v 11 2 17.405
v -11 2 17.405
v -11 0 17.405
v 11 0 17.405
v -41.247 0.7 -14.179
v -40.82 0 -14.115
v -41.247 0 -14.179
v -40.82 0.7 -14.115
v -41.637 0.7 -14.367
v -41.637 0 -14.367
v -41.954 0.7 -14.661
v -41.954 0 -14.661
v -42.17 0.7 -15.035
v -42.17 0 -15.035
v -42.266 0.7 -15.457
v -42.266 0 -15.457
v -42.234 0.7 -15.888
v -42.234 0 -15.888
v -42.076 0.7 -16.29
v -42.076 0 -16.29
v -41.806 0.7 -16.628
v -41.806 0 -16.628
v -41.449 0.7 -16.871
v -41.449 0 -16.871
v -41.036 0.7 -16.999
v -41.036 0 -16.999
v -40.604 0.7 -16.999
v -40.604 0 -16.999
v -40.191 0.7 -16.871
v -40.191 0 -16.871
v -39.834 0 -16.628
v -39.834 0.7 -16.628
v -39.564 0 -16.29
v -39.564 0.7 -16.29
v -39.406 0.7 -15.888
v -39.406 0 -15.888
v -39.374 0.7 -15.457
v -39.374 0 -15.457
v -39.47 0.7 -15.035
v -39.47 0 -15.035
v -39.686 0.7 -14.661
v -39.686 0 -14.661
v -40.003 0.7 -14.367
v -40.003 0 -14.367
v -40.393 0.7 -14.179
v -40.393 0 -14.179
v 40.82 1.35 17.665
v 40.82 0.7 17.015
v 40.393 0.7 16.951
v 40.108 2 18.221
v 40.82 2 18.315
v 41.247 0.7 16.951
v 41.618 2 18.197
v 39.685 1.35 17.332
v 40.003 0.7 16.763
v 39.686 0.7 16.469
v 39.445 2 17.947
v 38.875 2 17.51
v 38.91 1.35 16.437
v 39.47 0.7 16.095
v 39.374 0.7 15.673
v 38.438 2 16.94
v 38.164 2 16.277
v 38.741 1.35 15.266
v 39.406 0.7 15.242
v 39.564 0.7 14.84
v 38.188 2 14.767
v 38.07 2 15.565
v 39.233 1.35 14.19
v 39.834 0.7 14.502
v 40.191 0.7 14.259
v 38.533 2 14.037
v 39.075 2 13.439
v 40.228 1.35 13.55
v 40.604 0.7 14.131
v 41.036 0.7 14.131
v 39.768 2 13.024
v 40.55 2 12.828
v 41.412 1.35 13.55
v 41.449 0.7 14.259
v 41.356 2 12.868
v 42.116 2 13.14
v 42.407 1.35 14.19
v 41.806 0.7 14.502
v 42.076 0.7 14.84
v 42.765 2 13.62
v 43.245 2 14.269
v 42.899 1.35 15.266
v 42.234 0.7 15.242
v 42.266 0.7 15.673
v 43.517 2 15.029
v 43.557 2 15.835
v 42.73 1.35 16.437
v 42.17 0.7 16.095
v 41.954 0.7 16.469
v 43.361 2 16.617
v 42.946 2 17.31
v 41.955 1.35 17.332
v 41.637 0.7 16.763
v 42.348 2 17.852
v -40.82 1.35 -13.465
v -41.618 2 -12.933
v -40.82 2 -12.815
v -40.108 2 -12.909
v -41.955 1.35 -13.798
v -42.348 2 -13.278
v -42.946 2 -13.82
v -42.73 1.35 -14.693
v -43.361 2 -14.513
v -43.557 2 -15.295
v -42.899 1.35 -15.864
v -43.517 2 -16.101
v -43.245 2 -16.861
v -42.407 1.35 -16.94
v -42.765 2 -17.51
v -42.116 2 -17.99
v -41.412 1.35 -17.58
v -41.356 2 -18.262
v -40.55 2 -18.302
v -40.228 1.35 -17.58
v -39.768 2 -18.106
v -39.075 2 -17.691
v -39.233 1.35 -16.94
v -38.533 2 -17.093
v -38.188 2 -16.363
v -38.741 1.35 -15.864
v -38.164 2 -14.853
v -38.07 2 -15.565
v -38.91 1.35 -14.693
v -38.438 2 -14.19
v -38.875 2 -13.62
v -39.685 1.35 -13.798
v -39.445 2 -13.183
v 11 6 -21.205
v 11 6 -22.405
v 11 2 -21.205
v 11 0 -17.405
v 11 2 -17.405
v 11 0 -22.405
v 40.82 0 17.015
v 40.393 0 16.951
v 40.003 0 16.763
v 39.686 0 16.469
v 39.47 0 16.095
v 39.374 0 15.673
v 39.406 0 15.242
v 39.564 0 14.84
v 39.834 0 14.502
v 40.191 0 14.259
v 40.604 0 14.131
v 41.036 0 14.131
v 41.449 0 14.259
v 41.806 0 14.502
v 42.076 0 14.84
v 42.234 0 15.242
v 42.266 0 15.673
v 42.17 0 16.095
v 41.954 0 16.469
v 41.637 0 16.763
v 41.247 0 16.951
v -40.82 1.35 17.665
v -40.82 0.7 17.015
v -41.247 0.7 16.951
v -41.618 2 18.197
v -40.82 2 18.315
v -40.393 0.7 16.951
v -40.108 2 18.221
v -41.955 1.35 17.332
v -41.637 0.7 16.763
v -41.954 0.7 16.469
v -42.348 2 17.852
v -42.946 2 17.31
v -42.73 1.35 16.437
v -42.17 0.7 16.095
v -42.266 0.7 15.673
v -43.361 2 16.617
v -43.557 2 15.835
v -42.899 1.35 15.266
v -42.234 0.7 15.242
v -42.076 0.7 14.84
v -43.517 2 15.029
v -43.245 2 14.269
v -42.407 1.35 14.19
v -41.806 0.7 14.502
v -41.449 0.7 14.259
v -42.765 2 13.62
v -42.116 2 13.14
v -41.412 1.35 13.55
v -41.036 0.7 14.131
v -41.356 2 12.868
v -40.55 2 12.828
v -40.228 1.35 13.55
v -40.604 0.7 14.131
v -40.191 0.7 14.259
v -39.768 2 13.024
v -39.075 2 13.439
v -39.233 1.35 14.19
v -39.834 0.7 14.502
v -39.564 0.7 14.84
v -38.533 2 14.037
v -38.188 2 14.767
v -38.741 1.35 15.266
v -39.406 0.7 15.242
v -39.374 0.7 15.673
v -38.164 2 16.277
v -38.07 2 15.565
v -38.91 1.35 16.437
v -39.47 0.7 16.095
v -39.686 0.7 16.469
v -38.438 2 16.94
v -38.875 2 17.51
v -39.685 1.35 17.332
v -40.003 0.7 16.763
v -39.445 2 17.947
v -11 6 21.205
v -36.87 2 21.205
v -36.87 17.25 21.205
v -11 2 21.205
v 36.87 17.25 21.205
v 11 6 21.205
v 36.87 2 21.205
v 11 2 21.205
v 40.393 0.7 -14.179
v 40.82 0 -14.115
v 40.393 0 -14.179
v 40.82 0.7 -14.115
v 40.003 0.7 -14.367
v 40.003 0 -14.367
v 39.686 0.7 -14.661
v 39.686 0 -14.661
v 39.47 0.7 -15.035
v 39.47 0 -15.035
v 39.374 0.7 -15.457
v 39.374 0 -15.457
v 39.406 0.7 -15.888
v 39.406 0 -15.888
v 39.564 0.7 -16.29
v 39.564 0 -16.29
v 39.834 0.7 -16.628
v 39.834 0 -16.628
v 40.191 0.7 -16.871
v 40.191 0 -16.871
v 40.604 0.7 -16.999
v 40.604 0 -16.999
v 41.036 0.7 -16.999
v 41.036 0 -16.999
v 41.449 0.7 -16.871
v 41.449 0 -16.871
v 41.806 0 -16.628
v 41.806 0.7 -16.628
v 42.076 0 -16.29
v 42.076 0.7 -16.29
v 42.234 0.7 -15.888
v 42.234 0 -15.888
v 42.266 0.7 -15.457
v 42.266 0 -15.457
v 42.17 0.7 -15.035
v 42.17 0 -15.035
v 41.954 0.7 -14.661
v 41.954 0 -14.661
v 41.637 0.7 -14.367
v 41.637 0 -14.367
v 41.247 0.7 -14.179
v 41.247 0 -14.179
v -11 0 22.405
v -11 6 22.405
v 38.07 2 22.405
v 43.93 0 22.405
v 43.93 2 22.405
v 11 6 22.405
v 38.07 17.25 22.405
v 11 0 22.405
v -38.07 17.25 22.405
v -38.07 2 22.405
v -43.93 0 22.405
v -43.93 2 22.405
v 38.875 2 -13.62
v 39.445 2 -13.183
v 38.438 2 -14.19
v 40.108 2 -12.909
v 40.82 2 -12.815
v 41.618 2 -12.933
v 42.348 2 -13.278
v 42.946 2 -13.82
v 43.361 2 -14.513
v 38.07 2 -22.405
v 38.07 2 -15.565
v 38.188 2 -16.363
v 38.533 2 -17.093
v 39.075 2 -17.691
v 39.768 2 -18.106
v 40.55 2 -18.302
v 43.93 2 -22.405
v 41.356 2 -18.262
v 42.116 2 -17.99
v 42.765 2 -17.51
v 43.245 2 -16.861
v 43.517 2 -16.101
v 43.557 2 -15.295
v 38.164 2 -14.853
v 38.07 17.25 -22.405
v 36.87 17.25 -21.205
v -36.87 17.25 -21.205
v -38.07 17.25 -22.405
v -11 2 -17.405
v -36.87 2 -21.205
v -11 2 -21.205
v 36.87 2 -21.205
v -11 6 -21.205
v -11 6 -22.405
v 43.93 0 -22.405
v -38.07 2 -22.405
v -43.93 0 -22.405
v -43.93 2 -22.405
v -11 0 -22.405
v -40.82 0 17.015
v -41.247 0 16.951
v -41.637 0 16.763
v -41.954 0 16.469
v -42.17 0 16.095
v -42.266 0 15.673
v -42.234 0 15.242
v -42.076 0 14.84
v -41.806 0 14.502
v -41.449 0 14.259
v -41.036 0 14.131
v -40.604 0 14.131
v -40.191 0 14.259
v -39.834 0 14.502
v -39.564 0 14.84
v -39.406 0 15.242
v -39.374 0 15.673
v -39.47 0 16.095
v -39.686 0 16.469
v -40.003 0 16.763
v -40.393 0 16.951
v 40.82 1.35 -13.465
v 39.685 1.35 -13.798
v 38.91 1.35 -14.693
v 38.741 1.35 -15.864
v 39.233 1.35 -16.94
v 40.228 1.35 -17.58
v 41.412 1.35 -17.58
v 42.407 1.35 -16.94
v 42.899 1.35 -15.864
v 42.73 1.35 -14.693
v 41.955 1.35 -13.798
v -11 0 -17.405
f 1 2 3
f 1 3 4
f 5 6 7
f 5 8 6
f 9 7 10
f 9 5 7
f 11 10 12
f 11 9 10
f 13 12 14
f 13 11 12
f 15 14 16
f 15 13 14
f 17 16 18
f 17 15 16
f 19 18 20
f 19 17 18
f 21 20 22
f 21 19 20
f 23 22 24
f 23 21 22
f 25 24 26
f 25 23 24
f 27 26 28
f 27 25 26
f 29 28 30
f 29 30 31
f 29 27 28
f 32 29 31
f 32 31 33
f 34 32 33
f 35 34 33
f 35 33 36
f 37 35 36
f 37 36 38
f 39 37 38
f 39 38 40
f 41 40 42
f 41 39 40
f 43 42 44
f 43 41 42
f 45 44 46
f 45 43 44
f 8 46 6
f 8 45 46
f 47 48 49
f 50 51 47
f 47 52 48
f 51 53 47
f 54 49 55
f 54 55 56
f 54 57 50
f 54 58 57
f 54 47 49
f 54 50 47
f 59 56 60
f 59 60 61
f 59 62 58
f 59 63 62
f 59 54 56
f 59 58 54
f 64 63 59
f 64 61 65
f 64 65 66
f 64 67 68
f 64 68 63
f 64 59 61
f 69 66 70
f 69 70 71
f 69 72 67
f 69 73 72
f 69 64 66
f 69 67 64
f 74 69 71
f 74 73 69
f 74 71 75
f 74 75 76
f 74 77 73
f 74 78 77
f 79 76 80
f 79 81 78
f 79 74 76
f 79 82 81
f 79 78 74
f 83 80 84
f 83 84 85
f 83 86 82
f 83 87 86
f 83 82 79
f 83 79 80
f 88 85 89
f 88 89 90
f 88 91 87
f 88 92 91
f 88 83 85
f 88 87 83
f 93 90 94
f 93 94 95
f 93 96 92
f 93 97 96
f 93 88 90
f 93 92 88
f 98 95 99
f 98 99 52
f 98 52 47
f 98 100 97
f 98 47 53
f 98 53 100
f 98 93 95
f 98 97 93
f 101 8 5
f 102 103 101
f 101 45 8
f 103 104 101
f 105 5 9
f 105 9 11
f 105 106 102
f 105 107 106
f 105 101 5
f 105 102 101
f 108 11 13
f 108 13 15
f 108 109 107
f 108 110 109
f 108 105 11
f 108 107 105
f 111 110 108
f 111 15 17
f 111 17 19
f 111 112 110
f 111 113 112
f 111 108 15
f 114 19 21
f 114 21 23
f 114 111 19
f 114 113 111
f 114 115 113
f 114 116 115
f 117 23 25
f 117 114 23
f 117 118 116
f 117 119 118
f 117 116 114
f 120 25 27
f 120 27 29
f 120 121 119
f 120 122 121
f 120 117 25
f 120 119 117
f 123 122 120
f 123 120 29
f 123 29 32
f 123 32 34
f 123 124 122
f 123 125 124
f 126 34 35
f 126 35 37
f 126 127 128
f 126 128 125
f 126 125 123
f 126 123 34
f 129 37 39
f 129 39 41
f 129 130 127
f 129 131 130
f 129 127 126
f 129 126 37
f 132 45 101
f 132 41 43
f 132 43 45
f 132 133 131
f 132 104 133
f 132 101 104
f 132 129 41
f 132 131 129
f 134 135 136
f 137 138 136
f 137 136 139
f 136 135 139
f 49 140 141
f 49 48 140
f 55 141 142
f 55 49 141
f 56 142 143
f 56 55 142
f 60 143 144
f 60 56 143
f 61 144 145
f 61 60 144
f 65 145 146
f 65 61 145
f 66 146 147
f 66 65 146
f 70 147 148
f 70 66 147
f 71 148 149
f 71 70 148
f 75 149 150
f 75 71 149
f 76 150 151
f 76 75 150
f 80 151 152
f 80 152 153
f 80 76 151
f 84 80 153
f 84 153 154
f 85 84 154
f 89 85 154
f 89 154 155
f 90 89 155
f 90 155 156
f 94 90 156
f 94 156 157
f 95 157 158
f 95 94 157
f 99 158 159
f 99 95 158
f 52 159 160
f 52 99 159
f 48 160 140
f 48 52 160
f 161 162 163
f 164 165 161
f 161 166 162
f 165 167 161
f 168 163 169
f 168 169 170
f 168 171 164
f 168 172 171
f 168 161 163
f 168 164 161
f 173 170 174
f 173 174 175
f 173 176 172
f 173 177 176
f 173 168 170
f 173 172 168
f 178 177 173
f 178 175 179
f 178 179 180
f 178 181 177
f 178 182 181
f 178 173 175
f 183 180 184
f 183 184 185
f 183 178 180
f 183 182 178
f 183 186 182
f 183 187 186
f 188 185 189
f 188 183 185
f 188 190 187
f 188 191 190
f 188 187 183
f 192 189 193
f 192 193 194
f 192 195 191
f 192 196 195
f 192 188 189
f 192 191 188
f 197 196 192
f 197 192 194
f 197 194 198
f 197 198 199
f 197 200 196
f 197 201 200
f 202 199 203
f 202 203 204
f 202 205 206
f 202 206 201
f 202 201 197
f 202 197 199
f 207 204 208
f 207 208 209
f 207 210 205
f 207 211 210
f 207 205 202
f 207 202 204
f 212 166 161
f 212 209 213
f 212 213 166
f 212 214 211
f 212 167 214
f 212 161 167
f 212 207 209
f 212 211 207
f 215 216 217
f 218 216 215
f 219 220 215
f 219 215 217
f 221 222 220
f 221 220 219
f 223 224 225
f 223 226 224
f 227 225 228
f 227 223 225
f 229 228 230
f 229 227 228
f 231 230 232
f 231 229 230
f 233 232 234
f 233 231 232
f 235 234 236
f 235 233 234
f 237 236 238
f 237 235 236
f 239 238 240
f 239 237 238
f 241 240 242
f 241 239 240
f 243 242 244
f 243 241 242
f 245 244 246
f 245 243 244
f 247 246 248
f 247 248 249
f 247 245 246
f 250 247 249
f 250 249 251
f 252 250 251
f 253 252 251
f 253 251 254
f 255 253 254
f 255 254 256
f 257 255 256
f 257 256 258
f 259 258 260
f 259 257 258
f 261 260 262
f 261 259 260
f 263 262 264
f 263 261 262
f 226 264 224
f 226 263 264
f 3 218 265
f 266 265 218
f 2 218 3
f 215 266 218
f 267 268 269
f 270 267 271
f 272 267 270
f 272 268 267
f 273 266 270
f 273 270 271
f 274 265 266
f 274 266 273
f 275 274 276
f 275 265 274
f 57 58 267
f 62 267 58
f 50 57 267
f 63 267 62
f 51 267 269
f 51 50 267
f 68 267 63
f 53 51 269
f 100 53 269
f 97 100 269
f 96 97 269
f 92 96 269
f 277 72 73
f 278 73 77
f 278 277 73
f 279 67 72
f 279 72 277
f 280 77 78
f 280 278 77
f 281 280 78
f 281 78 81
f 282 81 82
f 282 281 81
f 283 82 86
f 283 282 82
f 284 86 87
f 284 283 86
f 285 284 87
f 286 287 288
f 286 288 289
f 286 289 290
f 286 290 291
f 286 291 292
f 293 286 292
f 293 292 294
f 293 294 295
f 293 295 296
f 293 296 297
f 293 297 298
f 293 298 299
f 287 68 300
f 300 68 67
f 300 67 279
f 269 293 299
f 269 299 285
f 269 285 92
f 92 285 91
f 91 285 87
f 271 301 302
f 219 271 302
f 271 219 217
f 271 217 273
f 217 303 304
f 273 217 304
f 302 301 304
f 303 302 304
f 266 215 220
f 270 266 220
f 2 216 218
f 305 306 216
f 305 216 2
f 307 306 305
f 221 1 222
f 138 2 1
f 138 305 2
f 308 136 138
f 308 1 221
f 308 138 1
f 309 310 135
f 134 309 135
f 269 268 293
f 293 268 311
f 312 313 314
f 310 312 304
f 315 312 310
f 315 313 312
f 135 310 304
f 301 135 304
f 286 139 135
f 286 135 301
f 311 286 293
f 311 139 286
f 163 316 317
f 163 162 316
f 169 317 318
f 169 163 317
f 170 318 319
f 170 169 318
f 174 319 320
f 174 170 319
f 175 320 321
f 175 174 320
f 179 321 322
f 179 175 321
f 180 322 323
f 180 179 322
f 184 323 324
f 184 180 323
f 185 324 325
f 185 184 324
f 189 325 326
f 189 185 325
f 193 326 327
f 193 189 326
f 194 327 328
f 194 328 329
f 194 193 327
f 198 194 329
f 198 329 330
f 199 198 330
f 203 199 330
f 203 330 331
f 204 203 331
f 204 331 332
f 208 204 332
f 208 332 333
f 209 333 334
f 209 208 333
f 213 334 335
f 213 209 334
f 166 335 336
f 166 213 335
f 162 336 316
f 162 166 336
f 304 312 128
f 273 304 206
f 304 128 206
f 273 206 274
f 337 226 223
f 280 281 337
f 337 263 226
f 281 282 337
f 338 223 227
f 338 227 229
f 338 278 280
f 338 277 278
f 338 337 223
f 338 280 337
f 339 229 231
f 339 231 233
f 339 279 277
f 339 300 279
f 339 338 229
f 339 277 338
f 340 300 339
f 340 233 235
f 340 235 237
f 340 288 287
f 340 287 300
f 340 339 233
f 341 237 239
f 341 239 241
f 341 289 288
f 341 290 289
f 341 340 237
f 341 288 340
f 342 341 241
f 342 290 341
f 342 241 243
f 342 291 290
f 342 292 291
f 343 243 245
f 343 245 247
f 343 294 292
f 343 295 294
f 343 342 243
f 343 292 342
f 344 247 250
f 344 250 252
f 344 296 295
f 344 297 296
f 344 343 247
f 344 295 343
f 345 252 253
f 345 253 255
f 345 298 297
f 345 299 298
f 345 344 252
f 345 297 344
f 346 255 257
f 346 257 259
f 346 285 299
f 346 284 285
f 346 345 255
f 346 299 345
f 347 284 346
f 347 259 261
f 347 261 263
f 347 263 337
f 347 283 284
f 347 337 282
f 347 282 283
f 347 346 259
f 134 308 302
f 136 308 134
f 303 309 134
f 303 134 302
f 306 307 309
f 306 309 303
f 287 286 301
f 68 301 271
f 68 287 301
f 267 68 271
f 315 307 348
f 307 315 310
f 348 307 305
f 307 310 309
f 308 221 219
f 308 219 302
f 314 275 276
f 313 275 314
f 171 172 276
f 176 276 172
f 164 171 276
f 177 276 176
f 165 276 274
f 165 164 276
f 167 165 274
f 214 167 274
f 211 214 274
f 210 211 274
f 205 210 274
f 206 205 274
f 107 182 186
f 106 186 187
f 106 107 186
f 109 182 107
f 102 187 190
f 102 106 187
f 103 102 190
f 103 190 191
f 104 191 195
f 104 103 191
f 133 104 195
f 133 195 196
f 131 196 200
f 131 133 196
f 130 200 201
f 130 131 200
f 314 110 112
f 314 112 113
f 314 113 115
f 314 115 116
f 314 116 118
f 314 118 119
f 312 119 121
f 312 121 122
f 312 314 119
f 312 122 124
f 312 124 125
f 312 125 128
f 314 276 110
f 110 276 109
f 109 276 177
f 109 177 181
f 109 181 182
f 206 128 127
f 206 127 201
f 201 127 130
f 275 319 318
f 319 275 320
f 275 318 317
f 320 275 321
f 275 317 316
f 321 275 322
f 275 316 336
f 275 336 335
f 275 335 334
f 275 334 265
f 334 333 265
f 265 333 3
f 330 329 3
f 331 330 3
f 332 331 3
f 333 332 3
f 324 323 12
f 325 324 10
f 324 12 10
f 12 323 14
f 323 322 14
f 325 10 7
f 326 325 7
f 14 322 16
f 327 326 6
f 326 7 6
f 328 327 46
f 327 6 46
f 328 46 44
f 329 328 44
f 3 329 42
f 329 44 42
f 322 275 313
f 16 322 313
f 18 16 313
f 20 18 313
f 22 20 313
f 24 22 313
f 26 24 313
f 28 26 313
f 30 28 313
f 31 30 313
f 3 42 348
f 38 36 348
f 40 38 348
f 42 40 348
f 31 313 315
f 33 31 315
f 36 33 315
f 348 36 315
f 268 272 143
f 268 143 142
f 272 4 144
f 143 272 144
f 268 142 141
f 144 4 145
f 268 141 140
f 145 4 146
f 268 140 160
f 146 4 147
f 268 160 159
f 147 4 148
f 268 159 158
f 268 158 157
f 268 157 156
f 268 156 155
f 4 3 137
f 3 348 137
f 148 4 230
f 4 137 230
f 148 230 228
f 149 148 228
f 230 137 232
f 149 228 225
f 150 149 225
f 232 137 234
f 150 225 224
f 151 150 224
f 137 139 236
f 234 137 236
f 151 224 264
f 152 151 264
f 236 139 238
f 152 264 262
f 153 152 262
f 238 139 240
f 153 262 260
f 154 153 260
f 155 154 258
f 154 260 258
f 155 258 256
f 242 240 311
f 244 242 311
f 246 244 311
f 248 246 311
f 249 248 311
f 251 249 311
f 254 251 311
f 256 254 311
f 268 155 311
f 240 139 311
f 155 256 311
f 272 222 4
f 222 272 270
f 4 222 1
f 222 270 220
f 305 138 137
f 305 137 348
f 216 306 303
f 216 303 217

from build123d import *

# Parameters (mm, degrees)
SKETCH1_W                                    = 87.86
SKETCH1_H                                    = 44.81
BOSS_EXTRUDE1_DEPTH                          = 2
CSK_FOR_M2_5_COUNTERSUNK_FLAT_HEAD_S_2_COUNT = 2
CSK_FOR_M2_5_COUNTERSUNK_FLAT_HEAD_S_2_PITCH = 31.13
CSK_FOR_M2_5_COUNTERSUNK_FLAT_HEAD_S_3_COUNT = 2
CSK_FOR_M2_5_COUNTERSUNK_FLAT_HEAD_S_3_PITCH = 87.373717444
CSK_FOR_M2_5_COUNTERSUNK_FLAT_HEAD_S_4_COUNT = 2
CSK_FOR_M2_5_COUNTERSUNK_FLAT_HEAD_S_4_PITCH = 81.64
BOSS_EXTRUDE2_DEPTH                          = 15.25
BOSS_EXTRUDE3_DEPTH                          = 15.25
CUT_EXTRUDE1_DEPTH                           = 50
CUT_EXTRUDE1_DEPTH_BACK                      = 15.25
CUT_EXTRUDE4_DEPTH                           = 15.25
SKETCH11_W                                   = 22
SKETCH11_H                                   = 5
CUT_EXTRUDE5_DEPTH                           = 15.25


with BuildPart() as part:
    # Sketch1 → Boss-Extrude1 (new body)
    with BuildSketch(Plane(origin=(0, 0, 0), x_dir=(1, 0, 0), z_dir=(0, 1, 0))):
        Rectangle(SKETCH1_W, SKETCH1_H)
    extrude(amount=BOSS_EXTRUDE1_DEPTH)

    # Sketch3 → CSK for M2.5 Countersunk Flat Head Screw1 (revolve, cut)
    with BuildSketch(Plane(origin=(-40.82, 2, -15.565), x_dir=(0, 0, 1), z_dir=(1, 0, 0))):
        Polygon((0, 0), (0, 2), (1.45, 2), (1.45, 1.3), (2.75, 0), align=None)
    csk_for_m2_5_countersunk_flat_head_screw = revolve(axis=Axis((-40.82, 8.35, -15.565), (0, -1, 0)), mode=Mode.SUBTRACT)

    # CSK for M2.5 Countersunk Flat Head S 2: CSK for M2.5 Countersunk Flat Head Screw1 ×2
    with Locations(*[(0, 0, i * CSK_FOR_M2_5_COUNTERSUNK_FLAT_HEAD_S_2_PITCH) for i in range(1, CSK_FOR_M2_5_COUNTERSUNK_FLAT_HEAD_S_2_COUNT)]):
        add(csk_for_m2_5_countersunk_flat_head_screw, mode=Mode.SUBTRACT)

    # CSK for M2.5 Countersunk Flat Head S 3: CSK for M2.5 Countersunk Flat Head Screw1 ×2
    with Locations(*[Vector(0.9343770917408808, 0, 0.35628563040046085) * (i * CSK_FOR_M2_5_COUNTERSUNK_FLAT_HEAD_S_3_PITCH) for i in range(1, CSK_FOR_M2_5_COUNTERSUNK_FLAT_HEAD_S_3_COUNT)]):
        add(csk_for_m2_5_countersunk_flat_head_screw, mode=Mode.SUBTRACT)

    # CSK for M2.5 Countersunk Flat Head S 4: CSK for M2.5 Countersunk Flat Head Screw1 ×2
    with Locations(*[(i * CSK_FOR_M2_5_COUNTERSUNK_FLAT_HEAD_S_4_PITCH, 0, 0) for i in range(1, CSK_FOR_M2_5_COUNTERSUNK_FLAT_HEAD_S_4_COUNT)]):
        add(csk_for_m2_5_countersunk_flat_head_screw, mode=Mode.SUBTRACT)

    # Sketch5 → Boss-Extrude2 (add)
    with BuildSketch(Plane(origin=(0, 2, 0), x_dir=(1, 0, 0), z_dir=(0, 1, 0))):
        Polygon((-38.07, 15.565), (-38.07, 22.405), (-36.87, 22.405), (-36.87, -22.405), (-38.07, -22.405), align=None)
    extrude(amount=BOSS_EXTRUDE2_DEPTH)

    # Sketch6 → Boss-Extrude3 (add)
    with BuildSketch(Plane(origin=(0, 2, 0), x_dir=(1, 0, 0), z_dir=(0, 1, 0))):
        Polygon((-36.87, 22.405), (38.07, 22.405), (38.07, -22.405), (-36.87, -22.405), (-36.87, -21.205), (36.87, -21.205), (36.87, 21.205), (-36.87, 21.205), align=None)
    extrude(amount=BOSS_EXTRUDE3_DEPTH)

    # Sketch7 → Cut-Extrude1 (cut, two sides: drawn at the far end of the back side and taken through both)
    with BuildSketch(Plane.XY.offset(-21.205).offset(-CUT_EXTRUDE1_DEPTH_BACK)):
        Polygon((0, 2), (-11, 2), (-11, 6), (11, 6), (11, 2), align=None)
    extrude(amount=CUT_EXTRUDE1_DEPTH + CUT_EXTRUDE1_DEPTH_BACK, mode=Mode.SUBTRACT)

    # Sketch10 → Cut-Extrude4 (cut)
    with BuildSketch(Plane(origin=(0, 2, 0), x_dir=(1, 0, 0), z_dir=(0, 1, 0))):
        Polygon((-11, 21.205), (-11, 22.405), (11, 22.405), (11, 17.405), (-11, 17.405), align=None)
    extrude(amount=-CUT_EXTRUDE4_DEPTH, mode=Mode.SUBTRACT)

    # Sketch11 → Cut-Extrude5 (cut)
    with BuildSketch(Plane(origin=(0, 2, 0), x_dir=(1, 0, 0), z_dir=(0, 1, 0))):
        with Locations((0, -19.905)):
            Rectangle(SKETCH11_W, SKETCH11_H)
    extrude(amount=-CUT_EXTRUDE5_DEPTH, mode=Mode.SUBTRACT)


solid = part.part
